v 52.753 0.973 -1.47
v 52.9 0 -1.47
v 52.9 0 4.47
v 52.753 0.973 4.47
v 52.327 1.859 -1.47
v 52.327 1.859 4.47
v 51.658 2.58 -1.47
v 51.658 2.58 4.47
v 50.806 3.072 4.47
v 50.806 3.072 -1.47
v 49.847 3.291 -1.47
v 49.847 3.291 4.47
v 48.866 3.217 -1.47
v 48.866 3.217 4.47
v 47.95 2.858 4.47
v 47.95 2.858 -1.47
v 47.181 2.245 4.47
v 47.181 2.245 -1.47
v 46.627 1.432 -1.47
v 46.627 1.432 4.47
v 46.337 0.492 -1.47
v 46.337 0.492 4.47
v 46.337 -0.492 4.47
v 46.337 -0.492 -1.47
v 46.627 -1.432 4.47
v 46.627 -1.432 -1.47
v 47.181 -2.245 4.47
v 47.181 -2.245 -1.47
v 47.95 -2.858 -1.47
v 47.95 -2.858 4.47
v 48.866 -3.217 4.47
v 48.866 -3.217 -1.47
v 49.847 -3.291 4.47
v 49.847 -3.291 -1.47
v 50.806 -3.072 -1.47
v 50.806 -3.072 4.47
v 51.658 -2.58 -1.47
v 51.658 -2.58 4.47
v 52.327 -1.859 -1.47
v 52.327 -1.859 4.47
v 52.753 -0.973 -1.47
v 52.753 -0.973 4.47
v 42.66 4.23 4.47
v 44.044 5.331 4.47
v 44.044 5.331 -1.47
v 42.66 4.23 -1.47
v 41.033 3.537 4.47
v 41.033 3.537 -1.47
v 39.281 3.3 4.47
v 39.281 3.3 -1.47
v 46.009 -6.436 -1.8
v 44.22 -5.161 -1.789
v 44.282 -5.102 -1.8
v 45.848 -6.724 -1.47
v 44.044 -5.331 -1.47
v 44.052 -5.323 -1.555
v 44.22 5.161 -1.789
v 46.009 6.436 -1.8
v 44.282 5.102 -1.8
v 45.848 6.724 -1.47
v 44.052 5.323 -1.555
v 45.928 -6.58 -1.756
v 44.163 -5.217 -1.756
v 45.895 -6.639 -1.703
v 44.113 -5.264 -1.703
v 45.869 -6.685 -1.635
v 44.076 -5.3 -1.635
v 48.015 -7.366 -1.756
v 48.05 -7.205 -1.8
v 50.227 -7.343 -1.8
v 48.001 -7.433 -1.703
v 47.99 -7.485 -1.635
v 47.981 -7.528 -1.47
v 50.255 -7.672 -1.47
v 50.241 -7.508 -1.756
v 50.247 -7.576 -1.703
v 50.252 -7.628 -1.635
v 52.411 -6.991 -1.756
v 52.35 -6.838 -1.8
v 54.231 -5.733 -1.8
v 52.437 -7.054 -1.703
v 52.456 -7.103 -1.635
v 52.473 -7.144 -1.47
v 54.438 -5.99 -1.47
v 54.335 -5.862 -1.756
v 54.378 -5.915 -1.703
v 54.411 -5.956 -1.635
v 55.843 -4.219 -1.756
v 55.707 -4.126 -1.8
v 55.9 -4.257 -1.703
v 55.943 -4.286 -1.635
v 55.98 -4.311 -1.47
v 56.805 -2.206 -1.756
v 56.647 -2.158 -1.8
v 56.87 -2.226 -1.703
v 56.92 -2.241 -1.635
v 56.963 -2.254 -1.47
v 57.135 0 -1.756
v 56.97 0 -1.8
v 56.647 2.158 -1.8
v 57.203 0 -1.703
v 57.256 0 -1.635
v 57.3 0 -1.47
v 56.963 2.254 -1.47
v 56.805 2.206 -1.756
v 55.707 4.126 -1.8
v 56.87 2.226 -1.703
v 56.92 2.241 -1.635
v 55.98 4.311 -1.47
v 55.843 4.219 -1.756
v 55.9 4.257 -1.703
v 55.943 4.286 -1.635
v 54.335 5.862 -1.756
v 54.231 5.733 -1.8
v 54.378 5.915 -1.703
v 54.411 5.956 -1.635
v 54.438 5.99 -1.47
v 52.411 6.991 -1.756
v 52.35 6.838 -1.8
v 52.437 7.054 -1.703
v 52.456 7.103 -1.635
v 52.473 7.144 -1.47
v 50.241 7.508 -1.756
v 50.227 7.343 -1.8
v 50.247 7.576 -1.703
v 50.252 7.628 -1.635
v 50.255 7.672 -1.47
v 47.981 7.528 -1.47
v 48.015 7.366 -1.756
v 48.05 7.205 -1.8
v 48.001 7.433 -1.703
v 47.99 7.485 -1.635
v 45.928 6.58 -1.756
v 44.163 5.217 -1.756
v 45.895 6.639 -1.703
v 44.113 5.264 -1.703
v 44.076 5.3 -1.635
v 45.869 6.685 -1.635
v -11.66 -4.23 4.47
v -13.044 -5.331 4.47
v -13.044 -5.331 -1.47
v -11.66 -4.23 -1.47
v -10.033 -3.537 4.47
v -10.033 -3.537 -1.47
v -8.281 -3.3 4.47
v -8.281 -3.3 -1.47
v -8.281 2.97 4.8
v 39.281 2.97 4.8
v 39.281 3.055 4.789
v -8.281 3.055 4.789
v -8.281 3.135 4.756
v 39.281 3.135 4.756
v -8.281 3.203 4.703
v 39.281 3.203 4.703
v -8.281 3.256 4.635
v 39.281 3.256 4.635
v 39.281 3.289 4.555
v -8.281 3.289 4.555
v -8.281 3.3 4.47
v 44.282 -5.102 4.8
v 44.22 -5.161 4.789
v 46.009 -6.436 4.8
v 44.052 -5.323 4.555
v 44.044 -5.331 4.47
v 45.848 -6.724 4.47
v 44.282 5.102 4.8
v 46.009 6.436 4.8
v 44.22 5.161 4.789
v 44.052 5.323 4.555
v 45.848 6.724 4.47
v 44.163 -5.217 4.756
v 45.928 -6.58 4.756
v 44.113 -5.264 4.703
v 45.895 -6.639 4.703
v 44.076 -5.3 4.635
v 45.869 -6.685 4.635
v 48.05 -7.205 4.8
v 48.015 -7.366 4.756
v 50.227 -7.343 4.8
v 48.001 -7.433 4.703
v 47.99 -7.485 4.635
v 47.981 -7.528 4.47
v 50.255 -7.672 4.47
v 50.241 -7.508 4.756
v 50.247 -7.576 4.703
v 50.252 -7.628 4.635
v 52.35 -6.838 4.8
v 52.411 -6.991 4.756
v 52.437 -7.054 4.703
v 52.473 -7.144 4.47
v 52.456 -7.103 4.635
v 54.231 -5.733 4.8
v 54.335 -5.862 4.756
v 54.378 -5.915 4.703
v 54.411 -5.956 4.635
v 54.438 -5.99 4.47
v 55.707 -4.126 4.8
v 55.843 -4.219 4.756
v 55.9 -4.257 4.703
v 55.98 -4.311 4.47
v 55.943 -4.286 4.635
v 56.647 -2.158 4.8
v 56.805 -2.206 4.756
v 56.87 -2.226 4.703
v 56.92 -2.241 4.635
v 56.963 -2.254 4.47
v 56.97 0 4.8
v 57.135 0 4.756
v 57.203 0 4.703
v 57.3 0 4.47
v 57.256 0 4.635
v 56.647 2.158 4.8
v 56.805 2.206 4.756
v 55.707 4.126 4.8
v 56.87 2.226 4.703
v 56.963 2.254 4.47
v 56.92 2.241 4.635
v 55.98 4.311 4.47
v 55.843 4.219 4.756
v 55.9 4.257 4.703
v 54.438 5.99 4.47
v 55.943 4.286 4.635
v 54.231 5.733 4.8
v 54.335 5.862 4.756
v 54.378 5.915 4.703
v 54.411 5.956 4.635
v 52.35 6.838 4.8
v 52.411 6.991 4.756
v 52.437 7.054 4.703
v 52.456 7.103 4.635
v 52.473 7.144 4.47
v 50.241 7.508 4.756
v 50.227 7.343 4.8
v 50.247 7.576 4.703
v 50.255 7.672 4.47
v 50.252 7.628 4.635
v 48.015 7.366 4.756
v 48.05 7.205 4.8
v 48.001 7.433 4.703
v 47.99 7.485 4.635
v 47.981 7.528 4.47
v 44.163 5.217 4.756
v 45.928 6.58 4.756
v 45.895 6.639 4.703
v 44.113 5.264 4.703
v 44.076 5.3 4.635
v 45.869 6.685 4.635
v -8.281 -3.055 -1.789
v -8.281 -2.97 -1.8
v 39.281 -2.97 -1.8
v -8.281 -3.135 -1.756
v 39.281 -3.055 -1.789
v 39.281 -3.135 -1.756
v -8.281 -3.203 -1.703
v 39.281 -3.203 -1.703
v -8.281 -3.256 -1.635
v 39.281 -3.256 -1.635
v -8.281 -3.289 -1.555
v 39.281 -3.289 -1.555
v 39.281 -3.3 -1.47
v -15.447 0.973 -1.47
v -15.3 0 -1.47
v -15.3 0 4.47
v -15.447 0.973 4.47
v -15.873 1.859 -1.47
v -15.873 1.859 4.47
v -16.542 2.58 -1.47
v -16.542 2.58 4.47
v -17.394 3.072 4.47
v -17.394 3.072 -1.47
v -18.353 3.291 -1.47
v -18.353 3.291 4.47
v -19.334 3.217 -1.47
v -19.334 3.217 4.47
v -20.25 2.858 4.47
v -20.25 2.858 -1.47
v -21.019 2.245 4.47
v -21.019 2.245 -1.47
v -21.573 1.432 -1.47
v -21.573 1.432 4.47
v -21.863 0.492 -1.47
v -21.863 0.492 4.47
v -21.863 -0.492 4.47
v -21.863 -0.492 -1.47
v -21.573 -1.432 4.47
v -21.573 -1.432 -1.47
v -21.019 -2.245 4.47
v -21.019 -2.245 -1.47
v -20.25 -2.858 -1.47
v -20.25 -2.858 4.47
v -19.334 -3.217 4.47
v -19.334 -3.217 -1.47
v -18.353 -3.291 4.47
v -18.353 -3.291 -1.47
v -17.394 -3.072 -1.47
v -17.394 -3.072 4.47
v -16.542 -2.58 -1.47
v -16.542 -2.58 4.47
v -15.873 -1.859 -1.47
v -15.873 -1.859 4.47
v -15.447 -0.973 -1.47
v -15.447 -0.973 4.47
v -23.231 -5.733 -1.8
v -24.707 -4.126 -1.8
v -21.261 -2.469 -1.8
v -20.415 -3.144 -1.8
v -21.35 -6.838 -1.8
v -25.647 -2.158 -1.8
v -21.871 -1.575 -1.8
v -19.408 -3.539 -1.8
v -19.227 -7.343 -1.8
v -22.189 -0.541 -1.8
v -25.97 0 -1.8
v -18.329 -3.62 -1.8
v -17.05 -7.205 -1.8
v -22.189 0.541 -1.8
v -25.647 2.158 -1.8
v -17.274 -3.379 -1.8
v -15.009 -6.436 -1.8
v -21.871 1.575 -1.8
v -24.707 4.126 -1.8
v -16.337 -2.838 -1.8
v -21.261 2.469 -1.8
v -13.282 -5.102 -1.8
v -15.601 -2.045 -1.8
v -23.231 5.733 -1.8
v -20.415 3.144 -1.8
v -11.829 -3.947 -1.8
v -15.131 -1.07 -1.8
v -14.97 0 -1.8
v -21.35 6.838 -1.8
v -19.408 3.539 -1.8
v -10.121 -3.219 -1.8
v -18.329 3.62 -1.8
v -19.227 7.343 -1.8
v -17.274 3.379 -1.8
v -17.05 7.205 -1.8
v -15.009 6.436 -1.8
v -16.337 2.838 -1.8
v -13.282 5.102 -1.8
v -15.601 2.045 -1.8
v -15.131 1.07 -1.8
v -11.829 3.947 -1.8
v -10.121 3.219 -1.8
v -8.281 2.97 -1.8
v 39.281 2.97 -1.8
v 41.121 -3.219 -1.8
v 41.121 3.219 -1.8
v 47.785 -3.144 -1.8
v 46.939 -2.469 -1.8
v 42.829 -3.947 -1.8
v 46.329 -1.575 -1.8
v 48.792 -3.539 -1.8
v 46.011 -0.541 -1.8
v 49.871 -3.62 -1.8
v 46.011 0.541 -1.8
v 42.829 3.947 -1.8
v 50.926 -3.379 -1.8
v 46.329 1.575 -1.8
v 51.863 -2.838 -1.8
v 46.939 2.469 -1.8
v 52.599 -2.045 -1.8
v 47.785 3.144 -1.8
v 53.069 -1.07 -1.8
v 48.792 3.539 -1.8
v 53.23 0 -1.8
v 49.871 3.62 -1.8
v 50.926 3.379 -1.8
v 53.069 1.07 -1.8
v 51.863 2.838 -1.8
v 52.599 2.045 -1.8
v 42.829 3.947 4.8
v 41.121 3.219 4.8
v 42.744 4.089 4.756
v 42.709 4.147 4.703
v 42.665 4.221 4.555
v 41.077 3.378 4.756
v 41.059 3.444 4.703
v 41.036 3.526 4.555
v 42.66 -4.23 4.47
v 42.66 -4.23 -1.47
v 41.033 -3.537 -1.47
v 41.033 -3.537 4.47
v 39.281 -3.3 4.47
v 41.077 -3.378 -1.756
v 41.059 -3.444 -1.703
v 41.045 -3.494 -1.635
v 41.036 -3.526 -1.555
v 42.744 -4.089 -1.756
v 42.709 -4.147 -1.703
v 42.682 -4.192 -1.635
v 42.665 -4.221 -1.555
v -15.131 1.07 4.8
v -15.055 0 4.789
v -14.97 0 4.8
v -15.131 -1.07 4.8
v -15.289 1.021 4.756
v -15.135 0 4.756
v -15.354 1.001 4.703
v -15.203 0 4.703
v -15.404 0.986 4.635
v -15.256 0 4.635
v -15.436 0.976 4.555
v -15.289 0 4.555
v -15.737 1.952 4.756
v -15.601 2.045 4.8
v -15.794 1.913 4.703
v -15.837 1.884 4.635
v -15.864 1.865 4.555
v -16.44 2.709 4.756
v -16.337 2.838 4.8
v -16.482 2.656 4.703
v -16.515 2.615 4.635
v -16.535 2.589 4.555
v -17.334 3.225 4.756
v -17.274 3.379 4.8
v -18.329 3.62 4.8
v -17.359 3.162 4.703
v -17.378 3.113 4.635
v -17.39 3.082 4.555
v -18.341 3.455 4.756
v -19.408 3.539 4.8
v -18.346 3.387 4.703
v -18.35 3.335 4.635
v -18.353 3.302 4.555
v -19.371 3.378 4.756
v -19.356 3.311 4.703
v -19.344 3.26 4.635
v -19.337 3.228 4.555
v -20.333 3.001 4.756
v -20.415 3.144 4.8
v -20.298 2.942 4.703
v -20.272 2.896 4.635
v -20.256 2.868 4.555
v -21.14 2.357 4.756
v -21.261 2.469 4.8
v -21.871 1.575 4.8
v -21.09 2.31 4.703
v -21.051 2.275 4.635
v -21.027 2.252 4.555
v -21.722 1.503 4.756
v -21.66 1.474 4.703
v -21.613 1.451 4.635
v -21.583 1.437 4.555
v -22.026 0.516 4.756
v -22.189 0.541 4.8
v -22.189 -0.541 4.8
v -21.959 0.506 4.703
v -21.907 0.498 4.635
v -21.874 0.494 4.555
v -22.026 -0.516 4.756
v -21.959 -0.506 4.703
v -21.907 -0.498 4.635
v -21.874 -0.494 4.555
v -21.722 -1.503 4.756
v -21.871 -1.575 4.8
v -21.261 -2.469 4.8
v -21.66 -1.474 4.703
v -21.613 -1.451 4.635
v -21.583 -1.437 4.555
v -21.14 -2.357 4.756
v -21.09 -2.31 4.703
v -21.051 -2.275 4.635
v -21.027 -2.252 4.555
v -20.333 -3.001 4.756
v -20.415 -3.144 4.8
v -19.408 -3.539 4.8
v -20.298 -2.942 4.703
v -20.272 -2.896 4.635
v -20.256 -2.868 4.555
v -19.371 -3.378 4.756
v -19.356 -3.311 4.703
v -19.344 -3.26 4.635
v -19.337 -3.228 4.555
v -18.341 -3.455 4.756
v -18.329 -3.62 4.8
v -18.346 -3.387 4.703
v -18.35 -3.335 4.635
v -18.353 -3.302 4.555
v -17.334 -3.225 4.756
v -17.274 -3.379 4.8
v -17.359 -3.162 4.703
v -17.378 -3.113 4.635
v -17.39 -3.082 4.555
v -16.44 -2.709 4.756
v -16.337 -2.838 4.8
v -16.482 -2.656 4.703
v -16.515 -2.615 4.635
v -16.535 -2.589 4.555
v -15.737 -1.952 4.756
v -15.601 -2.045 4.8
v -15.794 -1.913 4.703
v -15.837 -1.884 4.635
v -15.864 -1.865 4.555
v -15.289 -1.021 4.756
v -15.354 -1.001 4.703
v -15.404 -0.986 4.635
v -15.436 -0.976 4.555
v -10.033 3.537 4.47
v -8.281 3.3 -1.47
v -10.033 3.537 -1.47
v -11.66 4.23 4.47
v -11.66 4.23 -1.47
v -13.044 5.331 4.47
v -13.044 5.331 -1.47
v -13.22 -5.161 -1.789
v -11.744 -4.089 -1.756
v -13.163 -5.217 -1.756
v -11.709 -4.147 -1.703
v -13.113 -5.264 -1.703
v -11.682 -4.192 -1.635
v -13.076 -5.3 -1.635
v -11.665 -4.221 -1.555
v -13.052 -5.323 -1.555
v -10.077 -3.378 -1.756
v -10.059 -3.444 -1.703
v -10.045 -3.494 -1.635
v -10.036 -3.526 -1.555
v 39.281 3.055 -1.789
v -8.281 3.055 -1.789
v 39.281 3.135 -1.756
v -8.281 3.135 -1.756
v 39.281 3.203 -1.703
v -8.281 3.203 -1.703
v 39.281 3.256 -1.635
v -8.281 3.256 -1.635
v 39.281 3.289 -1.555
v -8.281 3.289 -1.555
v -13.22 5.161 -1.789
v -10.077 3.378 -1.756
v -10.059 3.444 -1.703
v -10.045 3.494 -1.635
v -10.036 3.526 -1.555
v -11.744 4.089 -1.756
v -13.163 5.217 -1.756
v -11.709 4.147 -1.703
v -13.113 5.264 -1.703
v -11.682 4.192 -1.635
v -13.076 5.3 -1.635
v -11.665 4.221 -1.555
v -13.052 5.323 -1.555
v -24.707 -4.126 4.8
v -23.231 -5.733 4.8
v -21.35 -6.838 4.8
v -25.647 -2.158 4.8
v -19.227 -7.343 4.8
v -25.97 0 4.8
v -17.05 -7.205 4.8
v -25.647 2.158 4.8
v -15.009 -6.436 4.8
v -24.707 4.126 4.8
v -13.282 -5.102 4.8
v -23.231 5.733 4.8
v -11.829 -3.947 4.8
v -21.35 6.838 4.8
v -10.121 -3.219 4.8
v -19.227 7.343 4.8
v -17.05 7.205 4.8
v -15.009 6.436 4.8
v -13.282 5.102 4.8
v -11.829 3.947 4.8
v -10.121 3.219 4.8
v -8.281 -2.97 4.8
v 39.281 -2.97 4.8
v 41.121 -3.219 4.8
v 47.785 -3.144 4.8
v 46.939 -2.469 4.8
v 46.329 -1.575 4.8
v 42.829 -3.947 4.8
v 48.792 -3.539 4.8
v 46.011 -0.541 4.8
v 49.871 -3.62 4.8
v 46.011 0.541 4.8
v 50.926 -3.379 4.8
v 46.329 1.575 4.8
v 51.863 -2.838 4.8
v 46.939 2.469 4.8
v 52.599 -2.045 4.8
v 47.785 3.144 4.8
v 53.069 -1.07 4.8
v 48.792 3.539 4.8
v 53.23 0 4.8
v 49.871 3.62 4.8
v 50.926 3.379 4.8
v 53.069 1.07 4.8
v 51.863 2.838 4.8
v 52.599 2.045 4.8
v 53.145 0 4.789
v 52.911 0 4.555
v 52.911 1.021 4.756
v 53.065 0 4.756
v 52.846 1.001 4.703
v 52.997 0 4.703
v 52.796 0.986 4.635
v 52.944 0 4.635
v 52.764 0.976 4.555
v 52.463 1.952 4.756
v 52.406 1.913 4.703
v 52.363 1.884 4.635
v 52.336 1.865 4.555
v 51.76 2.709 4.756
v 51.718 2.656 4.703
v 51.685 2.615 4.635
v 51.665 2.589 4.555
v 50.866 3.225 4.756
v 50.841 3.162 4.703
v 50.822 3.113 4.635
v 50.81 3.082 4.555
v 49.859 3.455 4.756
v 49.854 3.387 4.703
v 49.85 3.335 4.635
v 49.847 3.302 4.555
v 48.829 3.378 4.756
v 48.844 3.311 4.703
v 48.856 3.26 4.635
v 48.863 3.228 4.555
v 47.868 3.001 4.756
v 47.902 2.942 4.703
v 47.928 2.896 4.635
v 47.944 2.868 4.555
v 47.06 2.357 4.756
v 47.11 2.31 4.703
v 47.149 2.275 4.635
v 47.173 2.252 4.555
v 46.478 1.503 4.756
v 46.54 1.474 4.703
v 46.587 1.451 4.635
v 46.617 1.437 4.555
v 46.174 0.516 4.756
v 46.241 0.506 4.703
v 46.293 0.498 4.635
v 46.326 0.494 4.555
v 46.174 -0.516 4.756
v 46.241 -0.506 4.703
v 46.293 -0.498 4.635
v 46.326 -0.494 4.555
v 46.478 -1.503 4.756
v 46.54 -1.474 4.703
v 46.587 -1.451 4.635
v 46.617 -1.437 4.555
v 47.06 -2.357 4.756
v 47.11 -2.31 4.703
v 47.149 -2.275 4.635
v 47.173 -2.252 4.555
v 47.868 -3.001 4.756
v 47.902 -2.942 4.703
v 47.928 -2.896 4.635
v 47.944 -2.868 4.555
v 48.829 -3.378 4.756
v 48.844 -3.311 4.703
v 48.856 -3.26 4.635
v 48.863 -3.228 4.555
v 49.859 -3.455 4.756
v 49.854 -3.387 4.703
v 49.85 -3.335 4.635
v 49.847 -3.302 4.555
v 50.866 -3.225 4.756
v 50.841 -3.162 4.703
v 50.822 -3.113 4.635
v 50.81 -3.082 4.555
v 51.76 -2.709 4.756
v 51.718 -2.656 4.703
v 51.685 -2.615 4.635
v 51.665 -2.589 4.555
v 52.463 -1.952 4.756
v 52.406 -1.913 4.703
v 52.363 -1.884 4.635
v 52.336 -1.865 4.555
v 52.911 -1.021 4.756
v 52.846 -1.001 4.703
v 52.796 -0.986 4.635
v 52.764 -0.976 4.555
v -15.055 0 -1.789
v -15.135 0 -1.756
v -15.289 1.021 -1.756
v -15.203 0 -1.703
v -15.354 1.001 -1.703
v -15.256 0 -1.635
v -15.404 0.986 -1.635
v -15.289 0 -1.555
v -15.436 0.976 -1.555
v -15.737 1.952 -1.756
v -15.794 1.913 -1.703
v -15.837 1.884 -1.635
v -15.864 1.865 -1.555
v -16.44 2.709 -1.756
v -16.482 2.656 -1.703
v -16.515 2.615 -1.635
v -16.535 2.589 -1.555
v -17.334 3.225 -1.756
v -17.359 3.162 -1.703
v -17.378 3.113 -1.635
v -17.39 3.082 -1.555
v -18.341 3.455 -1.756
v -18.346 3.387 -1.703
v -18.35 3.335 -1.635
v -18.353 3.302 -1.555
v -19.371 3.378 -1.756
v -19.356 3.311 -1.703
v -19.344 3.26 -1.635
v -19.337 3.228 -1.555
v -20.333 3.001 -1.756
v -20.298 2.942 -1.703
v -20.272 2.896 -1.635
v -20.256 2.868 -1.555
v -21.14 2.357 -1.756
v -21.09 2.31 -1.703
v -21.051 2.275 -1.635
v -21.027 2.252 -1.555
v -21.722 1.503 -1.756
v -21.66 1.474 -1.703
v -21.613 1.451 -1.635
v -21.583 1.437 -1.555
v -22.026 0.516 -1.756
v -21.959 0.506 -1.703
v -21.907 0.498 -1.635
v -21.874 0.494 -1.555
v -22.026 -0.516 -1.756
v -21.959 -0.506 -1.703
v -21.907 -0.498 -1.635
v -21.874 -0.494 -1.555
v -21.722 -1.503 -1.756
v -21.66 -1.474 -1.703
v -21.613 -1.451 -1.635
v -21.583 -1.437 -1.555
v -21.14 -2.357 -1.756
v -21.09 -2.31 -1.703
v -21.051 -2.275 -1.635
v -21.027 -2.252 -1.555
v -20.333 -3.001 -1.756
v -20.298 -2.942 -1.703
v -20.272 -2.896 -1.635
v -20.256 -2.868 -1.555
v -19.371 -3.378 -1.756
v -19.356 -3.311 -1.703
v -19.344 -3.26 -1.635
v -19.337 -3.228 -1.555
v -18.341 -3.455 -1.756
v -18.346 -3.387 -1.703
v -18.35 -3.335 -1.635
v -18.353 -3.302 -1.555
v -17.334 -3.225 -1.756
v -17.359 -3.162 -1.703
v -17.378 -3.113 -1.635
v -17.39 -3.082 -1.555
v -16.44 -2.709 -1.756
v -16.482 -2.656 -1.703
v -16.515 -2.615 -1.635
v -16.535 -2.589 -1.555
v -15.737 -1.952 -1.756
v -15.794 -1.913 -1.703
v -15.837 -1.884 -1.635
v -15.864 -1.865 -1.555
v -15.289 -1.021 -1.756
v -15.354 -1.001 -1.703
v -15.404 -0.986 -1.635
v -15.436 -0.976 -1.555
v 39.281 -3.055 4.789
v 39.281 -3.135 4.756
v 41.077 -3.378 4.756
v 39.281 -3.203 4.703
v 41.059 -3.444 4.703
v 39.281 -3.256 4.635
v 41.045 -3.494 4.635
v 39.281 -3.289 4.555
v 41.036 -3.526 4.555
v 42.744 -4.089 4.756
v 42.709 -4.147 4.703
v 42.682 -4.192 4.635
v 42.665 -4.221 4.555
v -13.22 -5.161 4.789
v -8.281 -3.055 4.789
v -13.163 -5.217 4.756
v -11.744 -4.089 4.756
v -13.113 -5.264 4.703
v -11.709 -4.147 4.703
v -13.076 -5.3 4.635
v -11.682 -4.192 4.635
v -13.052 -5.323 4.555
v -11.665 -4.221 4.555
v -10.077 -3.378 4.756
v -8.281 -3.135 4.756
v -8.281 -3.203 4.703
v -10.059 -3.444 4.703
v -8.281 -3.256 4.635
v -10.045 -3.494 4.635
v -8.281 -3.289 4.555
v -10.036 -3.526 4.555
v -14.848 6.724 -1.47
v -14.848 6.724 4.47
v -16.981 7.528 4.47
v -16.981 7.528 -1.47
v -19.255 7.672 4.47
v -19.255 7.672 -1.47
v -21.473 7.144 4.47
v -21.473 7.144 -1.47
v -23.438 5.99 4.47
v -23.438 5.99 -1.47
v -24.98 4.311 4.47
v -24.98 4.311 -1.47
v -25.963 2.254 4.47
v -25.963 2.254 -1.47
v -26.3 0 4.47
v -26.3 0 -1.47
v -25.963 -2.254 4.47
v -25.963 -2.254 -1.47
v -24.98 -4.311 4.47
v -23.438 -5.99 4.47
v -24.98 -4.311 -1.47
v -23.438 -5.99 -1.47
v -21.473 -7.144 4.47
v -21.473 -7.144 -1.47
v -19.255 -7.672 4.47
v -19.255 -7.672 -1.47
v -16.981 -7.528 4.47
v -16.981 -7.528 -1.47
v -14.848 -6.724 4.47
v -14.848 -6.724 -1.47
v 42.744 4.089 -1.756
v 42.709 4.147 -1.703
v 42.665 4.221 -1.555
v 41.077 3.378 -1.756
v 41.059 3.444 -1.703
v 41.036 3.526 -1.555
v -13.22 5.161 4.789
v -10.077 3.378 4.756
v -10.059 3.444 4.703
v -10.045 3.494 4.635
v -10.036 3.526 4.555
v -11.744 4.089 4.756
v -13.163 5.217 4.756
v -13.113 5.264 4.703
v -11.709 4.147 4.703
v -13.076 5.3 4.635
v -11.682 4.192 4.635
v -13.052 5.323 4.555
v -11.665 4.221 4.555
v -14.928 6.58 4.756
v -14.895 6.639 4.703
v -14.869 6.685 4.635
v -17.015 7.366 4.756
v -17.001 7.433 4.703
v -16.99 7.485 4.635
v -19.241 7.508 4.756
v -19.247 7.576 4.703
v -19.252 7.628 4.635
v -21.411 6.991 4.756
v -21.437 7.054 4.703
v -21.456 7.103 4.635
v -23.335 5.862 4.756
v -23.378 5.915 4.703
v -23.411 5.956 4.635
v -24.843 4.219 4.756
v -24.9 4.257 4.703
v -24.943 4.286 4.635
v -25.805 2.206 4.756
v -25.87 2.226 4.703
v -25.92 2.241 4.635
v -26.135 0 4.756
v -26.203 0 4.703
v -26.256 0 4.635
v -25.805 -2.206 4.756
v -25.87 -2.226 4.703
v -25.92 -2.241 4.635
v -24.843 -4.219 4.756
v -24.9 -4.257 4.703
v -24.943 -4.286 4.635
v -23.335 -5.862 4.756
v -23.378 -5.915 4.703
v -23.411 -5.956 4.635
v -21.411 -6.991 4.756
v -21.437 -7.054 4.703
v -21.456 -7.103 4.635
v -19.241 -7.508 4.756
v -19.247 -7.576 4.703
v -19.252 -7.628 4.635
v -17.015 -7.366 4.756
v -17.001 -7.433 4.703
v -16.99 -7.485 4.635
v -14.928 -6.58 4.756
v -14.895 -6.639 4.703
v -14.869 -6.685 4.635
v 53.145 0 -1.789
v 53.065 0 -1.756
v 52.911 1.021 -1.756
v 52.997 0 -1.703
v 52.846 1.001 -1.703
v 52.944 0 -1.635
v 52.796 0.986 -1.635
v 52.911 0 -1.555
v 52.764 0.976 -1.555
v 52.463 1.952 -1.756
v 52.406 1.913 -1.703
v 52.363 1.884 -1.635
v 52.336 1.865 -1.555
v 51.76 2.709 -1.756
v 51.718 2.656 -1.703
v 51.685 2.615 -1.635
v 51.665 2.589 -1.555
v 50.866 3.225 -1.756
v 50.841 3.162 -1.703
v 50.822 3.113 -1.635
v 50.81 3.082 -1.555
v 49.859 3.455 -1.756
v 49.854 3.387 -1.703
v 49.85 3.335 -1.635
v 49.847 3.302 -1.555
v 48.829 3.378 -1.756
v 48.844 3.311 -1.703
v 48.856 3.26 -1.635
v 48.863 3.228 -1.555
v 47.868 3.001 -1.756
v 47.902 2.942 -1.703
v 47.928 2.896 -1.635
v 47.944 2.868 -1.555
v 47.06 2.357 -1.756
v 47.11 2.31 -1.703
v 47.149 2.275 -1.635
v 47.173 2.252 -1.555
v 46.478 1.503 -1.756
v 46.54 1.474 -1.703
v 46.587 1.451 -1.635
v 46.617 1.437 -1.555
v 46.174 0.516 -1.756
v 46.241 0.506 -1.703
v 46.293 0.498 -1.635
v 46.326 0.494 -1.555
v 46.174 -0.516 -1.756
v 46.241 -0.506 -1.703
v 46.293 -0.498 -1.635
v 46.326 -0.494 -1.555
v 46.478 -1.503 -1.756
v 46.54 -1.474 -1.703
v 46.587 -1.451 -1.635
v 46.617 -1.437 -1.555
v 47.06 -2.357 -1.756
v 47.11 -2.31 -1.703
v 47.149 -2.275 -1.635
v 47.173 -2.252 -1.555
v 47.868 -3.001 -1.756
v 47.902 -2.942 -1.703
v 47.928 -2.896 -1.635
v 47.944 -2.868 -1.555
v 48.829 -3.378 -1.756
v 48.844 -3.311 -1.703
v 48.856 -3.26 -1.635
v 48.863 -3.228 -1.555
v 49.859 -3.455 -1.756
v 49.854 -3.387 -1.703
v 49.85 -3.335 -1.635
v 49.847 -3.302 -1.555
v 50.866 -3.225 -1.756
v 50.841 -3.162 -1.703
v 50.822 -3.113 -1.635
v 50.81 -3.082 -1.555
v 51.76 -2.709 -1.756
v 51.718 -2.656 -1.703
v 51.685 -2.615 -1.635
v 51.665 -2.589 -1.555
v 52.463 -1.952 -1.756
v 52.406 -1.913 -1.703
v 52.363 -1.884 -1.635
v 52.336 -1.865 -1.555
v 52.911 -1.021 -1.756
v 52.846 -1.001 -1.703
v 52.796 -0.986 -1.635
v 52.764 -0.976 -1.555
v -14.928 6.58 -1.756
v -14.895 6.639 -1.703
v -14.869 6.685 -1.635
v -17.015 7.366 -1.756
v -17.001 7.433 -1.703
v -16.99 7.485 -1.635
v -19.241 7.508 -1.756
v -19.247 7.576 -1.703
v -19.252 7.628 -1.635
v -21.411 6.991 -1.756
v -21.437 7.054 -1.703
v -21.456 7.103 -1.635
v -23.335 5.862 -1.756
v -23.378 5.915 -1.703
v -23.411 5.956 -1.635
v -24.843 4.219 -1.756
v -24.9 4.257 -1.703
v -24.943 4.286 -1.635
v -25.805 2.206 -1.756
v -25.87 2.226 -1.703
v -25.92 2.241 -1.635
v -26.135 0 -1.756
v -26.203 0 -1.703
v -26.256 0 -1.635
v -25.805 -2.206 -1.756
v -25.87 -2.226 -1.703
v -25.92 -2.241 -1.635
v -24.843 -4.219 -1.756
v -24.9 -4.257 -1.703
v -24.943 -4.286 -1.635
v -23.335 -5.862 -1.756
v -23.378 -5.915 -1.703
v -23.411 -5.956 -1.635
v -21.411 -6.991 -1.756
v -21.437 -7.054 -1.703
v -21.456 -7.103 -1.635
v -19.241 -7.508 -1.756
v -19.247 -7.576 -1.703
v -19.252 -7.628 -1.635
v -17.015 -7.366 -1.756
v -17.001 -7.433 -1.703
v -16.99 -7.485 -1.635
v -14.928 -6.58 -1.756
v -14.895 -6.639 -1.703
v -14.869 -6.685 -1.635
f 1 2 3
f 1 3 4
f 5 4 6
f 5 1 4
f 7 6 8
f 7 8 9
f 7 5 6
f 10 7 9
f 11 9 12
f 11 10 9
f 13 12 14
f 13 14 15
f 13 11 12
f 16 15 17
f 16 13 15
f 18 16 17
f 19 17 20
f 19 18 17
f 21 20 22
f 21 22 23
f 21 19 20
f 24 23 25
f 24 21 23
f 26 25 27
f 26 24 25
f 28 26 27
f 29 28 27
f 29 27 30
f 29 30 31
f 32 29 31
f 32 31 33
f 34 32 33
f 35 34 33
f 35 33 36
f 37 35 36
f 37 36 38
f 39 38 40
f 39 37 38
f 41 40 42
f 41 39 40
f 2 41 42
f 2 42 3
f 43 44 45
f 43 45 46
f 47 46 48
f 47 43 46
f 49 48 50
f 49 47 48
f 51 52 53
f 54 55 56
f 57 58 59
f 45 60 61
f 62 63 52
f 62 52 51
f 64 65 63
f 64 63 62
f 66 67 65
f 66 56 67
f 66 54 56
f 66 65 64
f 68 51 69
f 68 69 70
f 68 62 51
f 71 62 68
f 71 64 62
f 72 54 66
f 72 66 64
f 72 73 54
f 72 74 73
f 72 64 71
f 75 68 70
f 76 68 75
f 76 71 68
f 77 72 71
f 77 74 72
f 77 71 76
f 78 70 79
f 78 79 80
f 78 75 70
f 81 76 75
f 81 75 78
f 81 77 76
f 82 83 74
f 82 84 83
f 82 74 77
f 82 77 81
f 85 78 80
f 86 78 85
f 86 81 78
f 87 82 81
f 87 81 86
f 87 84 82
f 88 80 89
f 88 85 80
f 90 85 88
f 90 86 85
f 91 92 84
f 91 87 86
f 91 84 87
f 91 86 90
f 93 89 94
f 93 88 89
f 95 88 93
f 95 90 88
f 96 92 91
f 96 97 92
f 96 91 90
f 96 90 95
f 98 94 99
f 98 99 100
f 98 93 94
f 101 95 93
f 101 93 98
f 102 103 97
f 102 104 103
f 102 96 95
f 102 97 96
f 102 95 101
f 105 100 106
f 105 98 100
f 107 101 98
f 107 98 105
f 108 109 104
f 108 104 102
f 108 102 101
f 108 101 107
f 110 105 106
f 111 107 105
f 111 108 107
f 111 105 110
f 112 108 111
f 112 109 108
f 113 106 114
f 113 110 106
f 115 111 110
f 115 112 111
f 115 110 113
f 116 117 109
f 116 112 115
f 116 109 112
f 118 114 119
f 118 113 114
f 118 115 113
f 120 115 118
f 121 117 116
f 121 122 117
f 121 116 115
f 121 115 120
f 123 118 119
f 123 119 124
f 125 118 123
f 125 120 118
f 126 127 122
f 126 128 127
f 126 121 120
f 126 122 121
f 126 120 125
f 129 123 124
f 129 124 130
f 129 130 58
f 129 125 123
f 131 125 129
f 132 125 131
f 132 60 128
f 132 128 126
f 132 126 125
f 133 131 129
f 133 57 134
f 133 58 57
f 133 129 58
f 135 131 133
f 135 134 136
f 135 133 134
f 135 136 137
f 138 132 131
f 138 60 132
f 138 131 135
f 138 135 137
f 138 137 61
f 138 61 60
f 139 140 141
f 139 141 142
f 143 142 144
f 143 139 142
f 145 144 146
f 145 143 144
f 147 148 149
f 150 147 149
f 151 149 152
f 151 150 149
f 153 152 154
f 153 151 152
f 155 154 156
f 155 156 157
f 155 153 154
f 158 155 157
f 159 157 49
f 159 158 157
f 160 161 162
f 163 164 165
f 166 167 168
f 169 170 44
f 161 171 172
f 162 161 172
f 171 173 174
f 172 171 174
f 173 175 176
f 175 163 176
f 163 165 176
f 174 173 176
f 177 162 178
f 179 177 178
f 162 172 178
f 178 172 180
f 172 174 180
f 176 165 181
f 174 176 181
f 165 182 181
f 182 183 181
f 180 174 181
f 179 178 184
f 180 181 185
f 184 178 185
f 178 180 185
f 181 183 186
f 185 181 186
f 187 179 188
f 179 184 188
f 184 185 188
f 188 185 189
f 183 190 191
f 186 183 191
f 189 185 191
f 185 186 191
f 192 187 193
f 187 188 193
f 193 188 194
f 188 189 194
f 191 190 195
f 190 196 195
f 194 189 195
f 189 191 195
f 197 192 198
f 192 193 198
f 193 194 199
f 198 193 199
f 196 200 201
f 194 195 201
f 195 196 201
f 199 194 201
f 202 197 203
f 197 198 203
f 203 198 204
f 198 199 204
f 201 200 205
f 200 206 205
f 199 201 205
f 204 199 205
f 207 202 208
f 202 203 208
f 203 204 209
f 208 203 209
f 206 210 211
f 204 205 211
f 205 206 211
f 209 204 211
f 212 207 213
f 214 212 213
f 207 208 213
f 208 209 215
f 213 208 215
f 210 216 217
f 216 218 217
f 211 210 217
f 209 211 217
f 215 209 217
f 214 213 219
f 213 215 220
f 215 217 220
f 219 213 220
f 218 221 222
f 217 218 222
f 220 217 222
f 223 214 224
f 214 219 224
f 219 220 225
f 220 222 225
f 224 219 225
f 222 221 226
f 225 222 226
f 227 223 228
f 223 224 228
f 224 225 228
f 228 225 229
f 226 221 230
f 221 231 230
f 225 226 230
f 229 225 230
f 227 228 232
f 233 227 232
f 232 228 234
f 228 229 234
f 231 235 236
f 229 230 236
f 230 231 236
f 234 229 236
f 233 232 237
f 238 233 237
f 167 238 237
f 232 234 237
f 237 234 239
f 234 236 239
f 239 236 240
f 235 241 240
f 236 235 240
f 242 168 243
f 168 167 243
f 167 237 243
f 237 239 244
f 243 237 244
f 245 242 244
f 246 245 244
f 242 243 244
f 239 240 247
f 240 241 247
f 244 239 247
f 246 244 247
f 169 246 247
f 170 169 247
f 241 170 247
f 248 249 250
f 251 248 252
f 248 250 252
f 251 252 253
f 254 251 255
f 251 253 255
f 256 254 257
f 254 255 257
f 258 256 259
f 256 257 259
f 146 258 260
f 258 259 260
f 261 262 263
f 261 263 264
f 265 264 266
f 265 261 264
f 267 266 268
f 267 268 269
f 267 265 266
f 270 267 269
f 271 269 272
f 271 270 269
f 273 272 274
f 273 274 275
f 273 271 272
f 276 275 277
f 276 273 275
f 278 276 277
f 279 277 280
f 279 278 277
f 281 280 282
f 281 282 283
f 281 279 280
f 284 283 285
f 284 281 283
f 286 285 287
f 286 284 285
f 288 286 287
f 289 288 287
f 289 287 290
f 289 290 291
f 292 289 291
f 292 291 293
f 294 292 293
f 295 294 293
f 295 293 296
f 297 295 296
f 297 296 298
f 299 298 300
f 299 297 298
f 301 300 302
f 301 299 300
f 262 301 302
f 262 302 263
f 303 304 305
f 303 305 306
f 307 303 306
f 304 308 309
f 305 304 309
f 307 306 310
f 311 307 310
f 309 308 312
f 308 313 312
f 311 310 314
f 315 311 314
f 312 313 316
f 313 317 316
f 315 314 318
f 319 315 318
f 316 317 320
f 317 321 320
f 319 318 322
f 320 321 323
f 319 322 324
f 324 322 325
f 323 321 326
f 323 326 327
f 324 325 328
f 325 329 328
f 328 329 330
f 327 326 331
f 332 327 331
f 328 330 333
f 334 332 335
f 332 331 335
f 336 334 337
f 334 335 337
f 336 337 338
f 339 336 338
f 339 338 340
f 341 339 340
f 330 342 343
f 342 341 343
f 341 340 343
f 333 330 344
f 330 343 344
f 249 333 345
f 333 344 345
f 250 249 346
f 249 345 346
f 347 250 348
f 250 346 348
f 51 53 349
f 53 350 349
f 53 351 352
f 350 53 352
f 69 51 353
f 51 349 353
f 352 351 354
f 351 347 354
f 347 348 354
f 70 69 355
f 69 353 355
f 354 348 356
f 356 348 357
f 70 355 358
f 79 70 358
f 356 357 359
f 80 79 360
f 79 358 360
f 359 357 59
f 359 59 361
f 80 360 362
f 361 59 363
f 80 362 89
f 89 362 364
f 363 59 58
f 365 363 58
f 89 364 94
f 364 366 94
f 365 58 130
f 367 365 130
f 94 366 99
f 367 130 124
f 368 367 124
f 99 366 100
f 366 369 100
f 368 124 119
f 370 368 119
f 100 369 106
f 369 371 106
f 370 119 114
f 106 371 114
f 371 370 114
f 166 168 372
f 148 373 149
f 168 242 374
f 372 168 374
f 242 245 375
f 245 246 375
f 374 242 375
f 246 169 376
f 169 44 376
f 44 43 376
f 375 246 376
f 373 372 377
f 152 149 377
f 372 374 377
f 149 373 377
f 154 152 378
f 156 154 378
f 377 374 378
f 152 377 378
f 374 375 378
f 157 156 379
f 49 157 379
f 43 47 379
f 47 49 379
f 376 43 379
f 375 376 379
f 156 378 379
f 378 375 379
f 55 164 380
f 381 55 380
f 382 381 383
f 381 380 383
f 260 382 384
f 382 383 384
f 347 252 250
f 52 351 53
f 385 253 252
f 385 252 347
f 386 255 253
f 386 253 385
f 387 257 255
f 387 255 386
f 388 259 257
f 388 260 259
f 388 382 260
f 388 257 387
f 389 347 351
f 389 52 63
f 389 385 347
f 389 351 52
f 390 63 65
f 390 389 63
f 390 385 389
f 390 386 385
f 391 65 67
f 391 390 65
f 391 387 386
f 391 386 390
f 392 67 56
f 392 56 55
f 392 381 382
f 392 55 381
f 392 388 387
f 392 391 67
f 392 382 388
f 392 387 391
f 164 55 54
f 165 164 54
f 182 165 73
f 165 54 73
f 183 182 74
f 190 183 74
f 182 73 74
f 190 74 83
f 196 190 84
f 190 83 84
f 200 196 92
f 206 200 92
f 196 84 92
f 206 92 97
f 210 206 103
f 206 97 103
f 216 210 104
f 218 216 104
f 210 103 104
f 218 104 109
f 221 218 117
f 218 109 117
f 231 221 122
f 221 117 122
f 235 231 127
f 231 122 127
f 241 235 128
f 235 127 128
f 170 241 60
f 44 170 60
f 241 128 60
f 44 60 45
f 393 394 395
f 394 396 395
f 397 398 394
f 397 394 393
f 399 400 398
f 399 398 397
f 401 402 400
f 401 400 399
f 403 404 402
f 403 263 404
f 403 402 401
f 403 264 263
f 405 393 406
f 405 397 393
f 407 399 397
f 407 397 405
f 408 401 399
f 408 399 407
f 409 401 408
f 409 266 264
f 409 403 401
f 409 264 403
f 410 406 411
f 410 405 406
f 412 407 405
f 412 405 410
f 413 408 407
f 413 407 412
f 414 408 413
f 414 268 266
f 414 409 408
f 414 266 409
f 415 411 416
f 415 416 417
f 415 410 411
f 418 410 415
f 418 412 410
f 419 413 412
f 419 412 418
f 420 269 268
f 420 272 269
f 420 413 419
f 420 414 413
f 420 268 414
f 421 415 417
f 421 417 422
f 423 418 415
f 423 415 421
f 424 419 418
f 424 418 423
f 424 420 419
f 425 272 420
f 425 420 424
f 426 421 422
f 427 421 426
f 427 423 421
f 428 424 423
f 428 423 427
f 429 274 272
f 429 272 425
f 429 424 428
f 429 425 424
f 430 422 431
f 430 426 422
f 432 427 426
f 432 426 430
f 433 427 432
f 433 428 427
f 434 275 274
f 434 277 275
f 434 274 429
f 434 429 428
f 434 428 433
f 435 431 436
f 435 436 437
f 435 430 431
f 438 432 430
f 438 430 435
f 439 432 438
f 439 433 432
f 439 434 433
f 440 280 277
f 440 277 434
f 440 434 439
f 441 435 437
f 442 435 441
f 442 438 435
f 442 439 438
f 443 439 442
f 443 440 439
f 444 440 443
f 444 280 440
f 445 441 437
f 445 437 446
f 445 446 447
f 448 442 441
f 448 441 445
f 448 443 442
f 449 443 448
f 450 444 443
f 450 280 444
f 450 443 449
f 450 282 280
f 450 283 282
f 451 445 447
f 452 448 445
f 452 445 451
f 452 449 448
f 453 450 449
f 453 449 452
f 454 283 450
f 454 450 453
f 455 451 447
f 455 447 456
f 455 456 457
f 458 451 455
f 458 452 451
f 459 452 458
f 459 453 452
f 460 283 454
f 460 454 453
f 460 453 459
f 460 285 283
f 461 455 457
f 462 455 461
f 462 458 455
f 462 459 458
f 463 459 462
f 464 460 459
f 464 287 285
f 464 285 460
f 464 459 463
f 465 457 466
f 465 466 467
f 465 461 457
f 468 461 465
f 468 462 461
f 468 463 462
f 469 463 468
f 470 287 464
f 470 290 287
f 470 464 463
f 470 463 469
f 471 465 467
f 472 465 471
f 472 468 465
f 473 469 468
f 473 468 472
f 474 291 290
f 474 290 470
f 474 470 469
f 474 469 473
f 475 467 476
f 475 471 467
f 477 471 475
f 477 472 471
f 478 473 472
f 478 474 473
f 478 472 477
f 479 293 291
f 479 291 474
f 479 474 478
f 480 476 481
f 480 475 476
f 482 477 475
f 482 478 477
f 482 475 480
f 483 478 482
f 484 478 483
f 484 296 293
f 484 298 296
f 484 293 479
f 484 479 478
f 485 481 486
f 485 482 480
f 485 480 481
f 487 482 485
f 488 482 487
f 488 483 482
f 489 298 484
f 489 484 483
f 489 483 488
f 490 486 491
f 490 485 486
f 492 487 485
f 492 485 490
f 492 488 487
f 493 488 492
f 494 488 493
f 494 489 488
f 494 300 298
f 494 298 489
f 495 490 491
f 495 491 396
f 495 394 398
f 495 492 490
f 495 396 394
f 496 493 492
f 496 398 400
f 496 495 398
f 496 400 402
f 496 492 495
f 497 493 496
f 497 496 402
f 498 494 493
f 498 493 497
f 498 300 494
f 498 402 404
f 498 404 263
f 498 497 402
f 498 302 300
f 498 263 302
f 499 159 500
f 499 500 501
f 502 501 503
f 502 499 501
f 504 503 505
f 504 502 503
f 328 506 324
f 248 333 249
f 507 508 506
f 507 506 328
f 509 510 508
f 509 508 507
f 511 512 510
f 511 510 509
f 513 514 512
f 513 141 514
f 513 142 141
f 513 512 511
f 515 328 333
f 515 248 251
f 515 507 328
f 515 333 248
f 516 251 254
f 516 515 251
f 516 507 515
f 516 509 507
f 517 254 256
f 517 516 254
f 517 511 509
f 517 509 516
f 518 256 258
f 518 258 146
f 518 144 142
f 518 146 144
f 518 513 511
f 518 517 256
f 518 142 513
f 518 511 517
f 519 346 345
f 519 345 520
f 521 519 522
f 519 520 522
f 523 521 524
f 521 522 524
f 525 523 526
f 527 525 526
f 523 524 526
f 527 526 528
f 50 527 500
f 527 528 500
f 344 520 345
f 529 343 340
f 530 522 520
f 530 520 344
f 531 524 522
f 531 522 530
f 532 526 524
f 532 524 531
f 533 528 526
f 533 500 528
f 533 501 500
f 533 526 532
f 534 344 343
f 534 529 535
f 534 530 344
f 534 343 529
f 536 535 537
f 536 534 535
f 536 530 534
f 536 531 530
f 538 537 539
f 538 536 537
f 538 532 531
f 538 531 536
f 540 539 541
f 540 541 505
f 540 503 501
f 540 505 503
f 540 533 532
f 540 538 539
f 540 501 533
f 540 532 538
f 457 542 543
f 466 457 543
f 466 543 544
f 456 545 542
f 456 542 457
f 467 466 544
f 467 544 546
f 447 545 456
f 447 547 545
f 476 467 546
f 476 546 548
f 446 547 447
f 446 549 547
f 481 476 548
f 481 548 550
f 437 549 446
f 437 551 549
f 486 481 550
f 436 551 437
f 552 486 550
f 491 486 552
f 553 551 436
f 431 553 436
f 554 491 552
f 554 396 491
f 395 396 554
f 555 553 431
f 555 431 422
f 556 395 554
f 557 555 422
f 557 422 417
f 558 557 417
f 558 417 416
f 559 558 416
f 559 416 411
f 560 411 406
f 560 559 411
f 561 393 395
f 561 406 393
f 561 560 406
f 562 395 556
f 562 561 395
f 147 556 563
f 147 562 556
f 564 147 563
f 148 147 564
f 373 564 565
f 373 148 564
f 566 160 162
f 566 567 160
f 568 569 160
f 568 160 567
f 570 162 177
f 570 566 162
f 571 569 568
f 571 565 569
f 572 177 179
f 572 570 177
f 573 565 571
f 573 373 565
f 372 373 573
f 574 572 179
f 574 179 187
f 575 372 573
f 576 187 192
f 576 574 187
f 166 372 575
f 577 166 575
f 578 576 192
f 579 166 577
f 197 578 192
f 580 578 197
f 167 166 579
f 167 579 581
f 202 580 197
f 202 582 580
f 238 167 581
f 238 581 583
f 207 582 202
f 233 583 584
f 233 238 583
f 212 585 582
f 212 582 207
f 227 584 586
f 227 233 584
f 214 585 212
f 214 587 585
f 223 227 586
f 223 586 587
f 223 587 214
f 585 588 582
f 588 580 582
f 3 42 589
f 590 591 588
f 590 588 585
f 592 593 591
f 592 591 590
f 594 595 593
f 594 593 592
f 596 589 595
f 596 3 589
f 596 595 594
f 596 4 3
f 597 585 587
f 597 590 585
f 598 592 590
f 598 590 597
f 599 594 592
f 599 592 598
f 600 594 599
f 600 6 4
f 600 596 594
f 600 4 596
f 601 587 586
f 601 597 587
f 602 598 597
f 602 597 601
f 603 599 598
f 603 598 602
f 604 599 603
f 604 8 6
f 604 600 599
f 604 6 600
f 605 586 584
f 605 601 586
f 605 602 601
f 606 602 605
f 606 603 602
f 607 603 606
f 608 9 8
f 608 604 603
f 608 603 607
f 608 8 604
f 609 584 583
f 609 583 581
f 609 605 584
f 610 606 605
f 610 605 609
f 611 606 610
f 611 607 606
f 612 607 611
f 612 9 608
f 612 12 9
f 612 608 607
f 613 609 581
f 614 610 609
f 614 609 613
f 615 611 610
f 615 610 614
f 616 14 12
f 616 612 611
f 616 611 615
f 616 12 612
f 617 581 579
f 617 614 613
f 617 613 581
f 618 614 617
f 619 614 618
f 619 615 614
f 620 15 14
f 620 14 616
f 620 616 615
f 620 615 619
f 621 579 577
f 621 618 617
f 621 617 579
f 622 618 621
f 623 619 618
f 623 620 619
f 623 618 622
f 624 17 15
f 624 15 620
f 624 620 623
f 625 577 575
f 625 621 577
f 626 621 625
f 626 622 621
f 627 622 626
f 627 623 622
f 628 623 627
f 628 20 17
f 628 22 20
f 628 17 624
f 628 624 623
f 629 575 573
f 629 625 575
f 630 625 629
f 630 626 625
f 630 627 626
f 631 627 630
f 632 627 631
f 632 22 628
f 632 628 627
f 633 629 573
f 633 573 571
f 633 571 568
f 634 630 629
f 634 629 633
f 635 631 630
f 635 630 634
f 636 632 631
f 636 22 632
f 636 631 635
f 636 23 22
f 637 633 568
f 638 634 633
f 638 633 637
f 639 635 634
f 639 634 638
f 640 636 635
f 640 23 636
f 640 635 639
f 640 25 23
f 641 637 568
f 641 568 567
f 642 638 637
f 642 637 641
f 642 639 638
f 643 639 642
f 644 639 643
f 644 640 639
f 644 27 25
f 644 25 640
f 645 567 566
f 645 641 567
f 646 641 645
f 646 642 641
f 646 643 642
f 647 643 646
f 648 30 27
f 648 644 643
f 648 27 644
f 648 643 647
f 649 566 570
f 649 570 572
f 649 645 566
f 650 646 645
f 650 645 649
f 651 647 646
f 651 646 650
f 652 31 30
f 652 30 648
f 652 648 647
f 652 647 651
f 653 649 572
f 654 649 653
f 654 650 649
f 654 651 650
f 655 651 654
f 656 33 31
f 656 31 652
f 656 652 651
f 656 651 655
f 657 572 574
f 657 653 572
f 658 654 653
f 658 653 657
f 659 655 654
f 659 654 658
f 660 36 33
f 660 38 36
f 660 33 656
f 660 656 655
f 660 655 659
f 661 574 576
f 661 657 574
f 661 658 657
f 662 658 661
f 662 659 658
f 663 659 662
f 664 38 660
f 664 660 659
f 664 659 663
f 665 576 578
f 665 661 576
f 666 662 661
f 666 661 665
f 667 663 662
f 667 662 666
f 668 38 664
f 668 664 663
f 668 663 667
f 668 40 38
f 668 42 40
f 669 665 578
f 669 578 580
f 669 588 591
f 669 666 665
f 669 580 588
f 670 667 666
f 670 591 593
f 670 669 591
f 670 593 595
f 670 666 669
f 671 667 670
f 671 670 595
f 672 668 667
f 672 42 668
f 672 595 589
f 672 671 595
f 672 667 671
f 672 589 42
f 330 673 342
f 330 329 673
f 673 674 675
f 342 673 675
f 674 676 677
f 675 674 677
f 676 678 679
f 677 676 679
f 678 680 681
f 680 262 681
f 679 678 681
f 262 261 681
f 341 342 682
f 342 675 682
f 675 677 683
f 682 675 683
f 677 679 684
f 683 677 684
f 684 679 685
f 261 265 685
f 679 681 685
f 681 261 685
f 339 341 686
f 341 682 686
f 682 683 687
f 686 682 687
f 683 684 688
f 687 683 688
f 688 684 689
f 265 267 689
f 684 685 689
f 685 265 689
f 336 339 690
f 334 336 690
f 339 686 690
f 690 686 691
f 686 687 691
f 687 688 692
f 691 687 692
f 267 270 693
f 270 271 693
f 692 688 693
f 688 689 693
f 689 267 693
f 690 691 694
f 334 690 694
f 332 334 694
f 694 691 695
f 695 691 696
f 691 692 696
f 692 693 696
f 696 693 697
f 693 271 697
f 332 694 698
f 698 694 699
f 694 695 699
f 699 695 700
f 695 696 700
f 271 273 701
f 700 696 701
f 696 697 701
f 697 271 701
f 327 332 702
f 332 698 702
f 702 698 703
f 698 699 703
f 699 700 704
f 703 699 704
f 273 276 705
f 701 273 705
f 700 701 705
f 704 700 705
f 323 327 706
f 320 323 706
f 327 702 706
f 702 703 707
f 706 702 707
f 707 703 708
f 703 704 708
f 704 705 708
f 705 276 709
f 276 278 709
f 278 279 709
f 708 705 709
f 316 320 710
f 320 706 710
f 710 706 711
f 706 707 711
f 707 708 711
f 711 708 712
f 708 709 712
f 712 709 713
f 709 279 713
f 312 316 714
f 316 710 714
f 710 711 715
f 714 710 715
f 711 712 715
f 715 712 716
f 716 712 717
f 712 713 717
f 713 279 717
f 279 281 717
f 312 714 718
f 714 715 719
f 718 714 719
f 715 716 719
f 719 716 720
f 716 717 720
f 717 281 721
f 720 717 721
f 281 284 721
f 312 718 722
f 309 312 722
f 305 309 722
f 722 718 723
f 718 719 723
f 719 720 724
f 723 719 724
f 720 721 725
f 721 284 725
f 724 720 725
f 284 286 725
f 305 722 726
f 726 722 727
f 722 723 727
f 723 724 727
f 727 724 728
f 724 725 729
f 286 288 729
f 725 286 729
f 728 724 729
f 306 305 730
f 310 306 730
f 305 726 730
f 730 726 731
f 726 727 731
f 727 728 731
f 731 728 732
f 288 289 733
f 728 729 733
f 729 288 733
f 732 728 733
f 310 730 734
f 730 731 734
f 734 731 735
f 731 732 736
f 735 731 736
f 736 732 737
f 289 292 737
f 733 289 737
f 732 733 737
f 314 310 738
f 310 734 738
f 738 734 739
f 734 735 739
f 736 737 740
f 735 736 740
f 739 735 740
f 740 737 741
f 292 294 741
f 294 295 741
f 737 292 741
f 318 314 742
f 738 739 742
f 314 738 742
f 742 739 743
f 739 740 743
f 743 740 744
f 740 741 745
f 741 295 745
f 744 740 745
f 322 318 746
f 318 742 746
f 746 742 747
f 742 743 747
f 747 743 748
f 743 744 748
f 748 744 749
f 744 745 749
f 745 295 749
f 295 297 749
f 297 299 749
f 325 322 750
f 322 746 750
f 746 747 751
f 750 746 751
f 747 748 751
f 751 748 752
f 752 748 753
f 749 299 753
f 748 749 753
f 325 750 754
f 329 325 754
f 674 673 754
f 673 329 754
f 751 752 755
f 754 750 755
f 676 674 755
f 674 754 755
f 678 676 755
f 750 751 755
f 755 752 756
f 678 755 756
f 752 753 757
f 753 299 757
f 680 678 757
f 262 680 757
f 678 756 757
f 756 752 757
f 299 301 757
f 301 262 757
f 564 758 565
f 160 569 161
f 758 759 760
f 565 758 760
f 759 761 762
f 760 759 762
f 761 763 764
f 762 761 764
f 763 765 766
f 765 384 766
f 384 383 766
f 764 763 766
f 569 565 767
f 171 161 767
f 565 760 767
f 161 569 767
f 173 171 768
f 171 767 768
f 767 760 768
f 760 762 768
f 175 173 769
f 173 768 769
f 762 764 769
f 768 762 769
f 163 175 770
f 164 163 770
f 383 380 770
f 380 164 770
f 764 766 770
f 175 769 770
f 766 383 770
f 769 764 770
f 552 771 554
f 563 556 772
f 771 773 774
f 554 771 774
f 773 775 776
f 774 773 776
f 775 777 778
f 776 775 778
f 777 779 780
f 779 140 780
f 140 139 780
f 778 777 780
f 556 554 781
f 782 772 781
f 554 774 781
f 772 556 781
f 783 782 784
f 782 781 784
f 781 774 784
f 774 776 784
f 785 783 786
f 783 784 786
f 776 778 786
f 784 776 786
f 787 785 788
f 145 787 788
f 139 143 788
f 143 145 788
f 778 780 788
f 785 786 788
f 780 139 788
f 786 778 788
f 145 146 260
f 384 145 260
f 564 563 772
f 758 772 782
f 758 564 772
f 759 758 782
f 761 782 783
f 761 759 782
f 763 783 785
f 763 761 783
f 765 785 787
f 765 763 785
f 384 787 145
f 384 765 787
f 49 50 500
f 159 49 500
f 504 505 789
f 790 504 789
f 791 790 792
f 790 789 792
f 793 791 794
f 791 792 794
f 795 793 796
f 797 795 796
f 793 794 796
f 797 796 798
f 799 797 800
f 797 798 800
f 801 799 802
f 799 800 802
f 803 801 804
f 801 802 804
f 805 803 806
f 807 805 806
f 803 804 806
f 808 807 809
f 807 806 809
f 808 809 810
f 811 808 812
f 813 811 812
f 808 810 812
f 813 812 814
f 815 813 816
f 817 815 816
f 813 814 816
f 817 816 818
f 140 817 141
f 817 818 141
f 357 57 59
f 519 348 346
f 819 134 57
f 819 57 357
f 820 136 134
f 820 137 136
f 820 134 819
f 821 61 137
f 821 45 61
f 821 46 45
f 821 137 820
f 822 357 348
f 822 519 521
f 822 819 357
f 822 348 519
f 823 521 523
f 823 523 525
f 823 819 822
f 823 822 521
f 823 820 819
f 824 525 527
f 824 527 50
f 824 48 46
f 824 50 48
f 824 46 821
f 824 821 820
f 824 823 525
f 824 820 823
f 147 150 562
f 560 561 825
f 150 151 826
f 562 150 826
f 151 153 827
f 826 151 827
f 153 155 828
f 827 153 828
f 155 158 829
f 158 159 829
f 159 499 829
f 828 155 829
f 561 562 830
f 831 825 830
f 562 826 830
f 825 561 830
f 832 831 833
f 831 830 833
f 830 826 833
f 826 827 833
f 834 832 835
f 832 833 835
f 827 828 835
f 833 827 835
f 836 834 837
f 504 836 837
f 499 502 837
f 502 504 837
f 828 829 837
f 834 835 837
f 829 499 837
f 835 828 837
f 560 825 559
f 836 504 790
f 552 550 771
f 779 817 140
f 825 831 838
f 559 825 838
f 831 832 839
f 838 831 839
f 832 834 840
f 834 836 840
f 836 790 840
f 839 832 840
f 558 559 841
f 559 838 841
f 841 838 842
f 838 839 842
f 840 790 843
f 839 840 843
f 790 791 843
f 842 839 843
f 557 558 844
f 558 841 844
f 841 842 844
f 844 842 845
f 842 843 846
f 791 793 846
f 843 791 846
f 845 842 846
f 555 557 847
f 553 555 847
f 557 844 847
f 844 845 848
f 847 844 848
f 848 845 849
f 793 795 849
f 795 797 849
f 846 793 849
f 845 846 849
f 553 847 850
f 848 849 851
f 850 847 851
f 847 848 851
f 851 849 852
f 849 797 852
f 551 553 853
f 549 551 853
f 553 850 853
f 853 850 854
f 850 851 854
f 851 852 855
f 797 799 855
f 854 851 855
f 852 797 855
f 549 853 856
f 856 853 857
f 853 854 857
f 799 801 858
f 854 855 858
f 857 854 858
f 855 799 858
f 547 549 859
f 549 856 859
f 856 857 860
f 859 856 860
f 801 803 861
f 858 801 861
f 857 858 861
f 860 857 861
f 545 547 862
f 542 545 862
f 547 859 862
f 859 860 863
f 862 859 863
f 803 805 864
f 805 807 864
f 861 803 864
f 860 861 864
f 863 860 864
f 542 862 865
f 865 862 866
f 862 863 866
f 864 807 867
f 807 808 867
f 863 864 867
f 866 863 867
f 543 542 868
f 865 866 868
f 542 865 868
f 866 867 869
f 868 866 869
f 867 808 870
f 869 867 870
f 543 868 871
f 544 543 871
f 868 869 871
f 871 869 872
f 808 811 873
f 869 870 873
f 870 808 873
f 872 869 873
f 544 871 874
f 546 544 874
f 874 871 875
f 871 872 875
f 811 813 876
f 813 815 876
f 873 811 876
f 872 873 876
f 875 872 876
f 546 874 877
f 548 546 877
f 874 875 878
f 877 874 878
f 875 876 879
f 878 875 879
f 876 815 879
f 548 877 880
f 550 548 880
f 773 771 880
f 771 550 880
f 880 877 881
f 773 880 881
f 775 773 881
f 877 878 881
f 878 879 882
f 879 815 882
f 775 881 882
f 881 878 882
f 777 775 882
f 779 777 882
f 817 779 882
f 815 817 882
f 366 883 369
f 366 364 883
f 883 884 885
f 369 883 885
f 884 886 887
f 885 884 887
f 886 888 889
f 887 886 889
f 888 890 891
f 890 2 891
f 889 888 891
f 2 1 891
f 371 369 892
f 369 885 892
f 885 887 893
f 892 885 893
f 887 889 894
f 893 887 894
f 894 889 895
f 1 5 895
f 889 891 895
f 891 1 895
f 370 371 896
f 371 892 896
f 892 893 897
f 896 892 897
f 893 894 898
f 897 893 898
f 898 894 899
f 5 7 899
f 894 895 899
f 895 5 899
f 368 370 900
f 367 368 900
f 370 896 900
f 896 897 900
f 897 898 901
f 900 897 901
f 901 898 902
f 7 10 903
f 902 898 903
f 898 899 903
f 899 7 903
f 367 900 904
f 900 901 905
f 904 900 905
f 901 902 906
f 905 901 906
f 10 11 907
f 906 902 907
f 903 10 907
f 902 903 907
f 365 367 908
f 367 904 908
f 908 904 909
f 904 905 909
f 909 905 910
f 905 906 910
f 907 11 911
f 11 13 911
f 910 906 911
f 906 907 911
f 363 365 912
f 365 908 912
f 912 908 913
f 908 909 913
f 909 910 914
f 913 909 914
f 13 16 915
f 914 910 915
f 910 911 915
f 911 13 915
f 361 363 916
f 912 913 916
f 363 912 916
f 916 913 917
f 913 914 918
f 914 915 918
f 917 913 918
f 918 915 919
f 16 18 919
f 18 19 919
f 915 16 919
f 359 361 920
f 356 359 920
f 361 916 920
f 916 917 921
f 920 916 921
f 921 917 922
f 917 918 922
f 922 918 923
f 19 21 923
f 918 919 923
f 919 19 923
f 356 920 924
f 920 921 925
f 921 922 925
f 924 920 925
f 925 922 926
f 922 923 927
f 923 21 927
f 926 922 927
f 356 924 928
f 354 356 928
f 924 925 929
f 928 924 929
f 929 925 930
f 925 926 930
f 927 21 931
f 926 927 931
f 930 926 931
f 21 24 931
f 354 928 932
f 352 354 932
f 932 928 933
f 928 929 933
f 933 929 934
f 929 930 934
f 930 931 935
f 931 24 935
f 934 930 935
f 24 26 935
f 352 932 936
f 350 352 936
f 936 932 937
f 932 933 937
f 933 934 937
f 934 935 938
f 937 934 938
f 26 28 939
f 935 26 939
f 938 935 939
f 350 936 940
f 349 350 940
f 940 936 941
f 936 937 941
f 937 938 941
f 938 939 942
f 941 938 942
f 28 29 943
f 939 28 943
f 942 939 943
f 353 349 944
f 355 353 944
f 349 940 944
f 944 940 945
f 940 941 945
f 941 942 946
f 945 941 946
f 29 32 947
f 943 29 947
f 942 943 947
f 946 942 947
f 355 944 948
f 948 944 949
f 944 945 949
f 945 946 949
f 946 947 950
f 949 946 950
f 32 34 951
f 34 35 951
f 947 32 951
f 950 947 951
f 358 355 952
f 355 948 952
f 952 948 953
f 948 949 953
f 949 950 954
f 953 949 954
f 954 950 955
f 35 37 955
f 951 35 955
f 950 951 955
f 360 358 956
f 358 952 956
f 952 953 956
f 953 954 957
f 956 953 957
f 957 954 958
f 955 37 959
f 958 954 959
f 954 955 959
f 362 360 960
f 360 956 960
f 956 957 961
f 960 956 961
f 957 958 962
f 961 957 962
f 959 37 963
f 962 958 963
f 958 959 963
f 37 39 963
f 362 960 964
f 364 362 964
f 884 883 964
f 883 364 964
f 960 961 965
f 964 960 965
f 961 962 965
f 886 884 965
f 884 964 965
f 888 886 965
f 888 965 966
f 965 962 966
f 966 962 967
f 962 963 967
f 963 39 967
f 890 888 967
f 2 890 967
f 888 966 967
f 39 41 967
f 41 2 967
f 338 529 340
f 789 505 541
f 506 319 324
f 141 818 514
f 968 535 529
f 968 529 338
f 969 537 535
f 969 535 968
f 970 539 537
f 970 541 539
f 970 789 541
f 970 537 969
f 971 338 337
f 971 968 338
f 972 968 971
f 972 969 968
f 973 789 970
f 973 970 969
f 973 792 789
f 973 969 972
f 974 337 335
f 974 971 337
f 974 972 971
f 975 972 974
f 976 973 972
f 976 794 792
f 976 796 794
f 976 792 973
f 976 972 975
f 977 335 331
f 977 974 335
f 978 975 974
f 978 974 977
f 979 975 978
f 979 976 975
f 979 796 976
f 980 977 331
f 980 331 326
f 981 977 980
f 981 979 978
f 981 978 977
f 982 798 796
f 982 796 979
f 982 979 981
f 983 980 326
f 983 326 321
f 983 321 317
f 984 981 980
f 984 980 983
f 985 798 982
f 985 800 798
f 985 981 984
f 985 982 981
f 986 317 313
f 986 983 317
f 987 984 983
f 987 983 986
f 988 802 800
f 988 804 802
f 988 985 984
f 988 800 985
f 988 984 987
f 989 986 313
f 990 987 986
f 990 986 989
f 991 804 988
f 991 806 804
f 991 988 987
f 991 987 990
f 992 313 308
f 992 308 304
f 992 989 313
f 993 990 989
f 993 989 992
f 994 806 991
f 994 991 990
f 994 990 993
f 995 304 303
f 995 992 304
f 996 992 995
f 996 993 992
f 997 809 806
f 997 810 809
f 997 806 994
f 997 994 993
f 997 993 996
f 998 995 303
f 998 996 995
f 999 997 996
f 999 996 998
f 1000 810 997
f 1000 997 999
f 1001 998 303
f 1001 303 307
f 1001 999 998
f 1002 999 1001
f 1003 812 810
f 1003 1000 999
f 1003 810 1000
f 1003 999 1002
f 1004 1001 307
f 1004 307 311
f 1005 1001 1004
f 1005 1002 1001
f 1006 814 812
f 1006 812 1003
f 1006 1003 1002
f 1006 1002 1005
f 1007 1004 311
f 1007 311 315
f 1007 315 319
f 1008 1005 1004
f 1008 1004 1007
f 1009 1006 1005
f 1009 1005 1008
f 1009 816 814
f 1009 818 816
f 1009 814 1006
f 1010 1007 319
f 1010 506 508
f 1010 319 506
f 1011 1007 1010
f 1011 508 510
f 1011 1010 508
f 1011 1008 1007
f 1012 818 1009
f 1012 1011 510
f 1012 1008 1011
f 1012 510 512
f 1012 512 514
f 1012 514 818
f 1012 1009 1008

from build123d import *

# Parameters (mm, degrees)
SKETCH_1_R      = 3.5
SKETCH_1_R_2    = 1.5
EXTRUDE_1_DEPTH = 3
FILLET_1_R      = 3
FILLET_2_R      = 0.15
SCALE_1_SCALE   = 2.2


with BuildPart() as part:
    # Эскиз1 → Бобышка-Вытянуть1 (new body)
    # profile 1 of 3: a face of its own
    with BuildSketch(Plane.XY):
        Circle(SKETCH_1_R)
        Circle(SKETCH_1_R_2, mode=Mode.SUBTRACT)
    # profile 2 of 3: a face of its own
    with BuildSketch(Plane.XY):
        with BuildLine():
            Line((3.16227766, -1.5), (27.83772234, -1.5))
            ThreePointArc((27.83772234, -1.5), (27.5, 0), (27.83772234, 1.5))
            Line((27.83772234, 1.5), (3.16227766, 1.5))
            ThreePointArc((3.16227766, 1.5), (3.414525722, 0.768774411), (3.5, 0))
            ThreePointArc((3.5, 0), (3.414525722, -0.768774411), (3.16227766, -1.5))
        make_face()
    # profile 3 of 3: a face of its own
    with BuildSketch(Plane.XY):
        with Locations((31, 0)):
            Circle(SKETCH_1_R)
        with Locations((31, 0)):
            Circle(SKETCH_1_R_2, mode=Mode.SUBTRACT)
    extrude(amount=EXTRUDE_1_DEPTH)

    # Скругление1
    fillet_1_edges = [part.edges().sort_by_distance(p)[0] for p in [
        (3.16227766, 1.5, 1.5),
        (27.83772234, 1.5, 1.5),
        (27.83772234, -1.5, 1.5),
        (3.16227766, -1.5, 1.5),
    ]]
    fillet(fillet_1_edges, radius=FILLET_1_R)

    # Скругление2
    fillet_2_edges = [part.edges().sort_by_distance(p)[0] for p in [
        (-1.5, 0, 0),
        (15.5, 1.5, 0),
        (15.5, 1.5, 3),
        (34.5, 0, 0),
        (34.5, 0, 3),
        (-3.5, 0, 0),
        (-3.5, 0, 3),
        (15.5, -1.5, 0),
        (15.5, -1.5, 3),
        (27.486281051, 1.740401367, 0),
        (27.486281051, 1.740401367, 3),
        (3.513718949, 1.740401367, 0),
        (3.513718949, 1.740401367, 3),
        (29.5, 0, 3),
        (27.486281051, -1.740401367, 0),
        (27.486281051, -1.740401367, 3),
        (3.513718949, -1.740401367, 0),
        (3.513718949, -1.740401367, 3),
        (-1.5, 0, 3),
        (29.5, 0, 0),
    ]]
    fillet(fillet_2_edges, radius=FILLET_2_R)


with BuildPart() as part_1:
    # Масштаб1: scaled about (15.5, 0, 1.5)
    add(part.part.scale(SCALE_1_SCALE).moved(Location((-18.6, 0, -1.8))))


solid = part_1.part
